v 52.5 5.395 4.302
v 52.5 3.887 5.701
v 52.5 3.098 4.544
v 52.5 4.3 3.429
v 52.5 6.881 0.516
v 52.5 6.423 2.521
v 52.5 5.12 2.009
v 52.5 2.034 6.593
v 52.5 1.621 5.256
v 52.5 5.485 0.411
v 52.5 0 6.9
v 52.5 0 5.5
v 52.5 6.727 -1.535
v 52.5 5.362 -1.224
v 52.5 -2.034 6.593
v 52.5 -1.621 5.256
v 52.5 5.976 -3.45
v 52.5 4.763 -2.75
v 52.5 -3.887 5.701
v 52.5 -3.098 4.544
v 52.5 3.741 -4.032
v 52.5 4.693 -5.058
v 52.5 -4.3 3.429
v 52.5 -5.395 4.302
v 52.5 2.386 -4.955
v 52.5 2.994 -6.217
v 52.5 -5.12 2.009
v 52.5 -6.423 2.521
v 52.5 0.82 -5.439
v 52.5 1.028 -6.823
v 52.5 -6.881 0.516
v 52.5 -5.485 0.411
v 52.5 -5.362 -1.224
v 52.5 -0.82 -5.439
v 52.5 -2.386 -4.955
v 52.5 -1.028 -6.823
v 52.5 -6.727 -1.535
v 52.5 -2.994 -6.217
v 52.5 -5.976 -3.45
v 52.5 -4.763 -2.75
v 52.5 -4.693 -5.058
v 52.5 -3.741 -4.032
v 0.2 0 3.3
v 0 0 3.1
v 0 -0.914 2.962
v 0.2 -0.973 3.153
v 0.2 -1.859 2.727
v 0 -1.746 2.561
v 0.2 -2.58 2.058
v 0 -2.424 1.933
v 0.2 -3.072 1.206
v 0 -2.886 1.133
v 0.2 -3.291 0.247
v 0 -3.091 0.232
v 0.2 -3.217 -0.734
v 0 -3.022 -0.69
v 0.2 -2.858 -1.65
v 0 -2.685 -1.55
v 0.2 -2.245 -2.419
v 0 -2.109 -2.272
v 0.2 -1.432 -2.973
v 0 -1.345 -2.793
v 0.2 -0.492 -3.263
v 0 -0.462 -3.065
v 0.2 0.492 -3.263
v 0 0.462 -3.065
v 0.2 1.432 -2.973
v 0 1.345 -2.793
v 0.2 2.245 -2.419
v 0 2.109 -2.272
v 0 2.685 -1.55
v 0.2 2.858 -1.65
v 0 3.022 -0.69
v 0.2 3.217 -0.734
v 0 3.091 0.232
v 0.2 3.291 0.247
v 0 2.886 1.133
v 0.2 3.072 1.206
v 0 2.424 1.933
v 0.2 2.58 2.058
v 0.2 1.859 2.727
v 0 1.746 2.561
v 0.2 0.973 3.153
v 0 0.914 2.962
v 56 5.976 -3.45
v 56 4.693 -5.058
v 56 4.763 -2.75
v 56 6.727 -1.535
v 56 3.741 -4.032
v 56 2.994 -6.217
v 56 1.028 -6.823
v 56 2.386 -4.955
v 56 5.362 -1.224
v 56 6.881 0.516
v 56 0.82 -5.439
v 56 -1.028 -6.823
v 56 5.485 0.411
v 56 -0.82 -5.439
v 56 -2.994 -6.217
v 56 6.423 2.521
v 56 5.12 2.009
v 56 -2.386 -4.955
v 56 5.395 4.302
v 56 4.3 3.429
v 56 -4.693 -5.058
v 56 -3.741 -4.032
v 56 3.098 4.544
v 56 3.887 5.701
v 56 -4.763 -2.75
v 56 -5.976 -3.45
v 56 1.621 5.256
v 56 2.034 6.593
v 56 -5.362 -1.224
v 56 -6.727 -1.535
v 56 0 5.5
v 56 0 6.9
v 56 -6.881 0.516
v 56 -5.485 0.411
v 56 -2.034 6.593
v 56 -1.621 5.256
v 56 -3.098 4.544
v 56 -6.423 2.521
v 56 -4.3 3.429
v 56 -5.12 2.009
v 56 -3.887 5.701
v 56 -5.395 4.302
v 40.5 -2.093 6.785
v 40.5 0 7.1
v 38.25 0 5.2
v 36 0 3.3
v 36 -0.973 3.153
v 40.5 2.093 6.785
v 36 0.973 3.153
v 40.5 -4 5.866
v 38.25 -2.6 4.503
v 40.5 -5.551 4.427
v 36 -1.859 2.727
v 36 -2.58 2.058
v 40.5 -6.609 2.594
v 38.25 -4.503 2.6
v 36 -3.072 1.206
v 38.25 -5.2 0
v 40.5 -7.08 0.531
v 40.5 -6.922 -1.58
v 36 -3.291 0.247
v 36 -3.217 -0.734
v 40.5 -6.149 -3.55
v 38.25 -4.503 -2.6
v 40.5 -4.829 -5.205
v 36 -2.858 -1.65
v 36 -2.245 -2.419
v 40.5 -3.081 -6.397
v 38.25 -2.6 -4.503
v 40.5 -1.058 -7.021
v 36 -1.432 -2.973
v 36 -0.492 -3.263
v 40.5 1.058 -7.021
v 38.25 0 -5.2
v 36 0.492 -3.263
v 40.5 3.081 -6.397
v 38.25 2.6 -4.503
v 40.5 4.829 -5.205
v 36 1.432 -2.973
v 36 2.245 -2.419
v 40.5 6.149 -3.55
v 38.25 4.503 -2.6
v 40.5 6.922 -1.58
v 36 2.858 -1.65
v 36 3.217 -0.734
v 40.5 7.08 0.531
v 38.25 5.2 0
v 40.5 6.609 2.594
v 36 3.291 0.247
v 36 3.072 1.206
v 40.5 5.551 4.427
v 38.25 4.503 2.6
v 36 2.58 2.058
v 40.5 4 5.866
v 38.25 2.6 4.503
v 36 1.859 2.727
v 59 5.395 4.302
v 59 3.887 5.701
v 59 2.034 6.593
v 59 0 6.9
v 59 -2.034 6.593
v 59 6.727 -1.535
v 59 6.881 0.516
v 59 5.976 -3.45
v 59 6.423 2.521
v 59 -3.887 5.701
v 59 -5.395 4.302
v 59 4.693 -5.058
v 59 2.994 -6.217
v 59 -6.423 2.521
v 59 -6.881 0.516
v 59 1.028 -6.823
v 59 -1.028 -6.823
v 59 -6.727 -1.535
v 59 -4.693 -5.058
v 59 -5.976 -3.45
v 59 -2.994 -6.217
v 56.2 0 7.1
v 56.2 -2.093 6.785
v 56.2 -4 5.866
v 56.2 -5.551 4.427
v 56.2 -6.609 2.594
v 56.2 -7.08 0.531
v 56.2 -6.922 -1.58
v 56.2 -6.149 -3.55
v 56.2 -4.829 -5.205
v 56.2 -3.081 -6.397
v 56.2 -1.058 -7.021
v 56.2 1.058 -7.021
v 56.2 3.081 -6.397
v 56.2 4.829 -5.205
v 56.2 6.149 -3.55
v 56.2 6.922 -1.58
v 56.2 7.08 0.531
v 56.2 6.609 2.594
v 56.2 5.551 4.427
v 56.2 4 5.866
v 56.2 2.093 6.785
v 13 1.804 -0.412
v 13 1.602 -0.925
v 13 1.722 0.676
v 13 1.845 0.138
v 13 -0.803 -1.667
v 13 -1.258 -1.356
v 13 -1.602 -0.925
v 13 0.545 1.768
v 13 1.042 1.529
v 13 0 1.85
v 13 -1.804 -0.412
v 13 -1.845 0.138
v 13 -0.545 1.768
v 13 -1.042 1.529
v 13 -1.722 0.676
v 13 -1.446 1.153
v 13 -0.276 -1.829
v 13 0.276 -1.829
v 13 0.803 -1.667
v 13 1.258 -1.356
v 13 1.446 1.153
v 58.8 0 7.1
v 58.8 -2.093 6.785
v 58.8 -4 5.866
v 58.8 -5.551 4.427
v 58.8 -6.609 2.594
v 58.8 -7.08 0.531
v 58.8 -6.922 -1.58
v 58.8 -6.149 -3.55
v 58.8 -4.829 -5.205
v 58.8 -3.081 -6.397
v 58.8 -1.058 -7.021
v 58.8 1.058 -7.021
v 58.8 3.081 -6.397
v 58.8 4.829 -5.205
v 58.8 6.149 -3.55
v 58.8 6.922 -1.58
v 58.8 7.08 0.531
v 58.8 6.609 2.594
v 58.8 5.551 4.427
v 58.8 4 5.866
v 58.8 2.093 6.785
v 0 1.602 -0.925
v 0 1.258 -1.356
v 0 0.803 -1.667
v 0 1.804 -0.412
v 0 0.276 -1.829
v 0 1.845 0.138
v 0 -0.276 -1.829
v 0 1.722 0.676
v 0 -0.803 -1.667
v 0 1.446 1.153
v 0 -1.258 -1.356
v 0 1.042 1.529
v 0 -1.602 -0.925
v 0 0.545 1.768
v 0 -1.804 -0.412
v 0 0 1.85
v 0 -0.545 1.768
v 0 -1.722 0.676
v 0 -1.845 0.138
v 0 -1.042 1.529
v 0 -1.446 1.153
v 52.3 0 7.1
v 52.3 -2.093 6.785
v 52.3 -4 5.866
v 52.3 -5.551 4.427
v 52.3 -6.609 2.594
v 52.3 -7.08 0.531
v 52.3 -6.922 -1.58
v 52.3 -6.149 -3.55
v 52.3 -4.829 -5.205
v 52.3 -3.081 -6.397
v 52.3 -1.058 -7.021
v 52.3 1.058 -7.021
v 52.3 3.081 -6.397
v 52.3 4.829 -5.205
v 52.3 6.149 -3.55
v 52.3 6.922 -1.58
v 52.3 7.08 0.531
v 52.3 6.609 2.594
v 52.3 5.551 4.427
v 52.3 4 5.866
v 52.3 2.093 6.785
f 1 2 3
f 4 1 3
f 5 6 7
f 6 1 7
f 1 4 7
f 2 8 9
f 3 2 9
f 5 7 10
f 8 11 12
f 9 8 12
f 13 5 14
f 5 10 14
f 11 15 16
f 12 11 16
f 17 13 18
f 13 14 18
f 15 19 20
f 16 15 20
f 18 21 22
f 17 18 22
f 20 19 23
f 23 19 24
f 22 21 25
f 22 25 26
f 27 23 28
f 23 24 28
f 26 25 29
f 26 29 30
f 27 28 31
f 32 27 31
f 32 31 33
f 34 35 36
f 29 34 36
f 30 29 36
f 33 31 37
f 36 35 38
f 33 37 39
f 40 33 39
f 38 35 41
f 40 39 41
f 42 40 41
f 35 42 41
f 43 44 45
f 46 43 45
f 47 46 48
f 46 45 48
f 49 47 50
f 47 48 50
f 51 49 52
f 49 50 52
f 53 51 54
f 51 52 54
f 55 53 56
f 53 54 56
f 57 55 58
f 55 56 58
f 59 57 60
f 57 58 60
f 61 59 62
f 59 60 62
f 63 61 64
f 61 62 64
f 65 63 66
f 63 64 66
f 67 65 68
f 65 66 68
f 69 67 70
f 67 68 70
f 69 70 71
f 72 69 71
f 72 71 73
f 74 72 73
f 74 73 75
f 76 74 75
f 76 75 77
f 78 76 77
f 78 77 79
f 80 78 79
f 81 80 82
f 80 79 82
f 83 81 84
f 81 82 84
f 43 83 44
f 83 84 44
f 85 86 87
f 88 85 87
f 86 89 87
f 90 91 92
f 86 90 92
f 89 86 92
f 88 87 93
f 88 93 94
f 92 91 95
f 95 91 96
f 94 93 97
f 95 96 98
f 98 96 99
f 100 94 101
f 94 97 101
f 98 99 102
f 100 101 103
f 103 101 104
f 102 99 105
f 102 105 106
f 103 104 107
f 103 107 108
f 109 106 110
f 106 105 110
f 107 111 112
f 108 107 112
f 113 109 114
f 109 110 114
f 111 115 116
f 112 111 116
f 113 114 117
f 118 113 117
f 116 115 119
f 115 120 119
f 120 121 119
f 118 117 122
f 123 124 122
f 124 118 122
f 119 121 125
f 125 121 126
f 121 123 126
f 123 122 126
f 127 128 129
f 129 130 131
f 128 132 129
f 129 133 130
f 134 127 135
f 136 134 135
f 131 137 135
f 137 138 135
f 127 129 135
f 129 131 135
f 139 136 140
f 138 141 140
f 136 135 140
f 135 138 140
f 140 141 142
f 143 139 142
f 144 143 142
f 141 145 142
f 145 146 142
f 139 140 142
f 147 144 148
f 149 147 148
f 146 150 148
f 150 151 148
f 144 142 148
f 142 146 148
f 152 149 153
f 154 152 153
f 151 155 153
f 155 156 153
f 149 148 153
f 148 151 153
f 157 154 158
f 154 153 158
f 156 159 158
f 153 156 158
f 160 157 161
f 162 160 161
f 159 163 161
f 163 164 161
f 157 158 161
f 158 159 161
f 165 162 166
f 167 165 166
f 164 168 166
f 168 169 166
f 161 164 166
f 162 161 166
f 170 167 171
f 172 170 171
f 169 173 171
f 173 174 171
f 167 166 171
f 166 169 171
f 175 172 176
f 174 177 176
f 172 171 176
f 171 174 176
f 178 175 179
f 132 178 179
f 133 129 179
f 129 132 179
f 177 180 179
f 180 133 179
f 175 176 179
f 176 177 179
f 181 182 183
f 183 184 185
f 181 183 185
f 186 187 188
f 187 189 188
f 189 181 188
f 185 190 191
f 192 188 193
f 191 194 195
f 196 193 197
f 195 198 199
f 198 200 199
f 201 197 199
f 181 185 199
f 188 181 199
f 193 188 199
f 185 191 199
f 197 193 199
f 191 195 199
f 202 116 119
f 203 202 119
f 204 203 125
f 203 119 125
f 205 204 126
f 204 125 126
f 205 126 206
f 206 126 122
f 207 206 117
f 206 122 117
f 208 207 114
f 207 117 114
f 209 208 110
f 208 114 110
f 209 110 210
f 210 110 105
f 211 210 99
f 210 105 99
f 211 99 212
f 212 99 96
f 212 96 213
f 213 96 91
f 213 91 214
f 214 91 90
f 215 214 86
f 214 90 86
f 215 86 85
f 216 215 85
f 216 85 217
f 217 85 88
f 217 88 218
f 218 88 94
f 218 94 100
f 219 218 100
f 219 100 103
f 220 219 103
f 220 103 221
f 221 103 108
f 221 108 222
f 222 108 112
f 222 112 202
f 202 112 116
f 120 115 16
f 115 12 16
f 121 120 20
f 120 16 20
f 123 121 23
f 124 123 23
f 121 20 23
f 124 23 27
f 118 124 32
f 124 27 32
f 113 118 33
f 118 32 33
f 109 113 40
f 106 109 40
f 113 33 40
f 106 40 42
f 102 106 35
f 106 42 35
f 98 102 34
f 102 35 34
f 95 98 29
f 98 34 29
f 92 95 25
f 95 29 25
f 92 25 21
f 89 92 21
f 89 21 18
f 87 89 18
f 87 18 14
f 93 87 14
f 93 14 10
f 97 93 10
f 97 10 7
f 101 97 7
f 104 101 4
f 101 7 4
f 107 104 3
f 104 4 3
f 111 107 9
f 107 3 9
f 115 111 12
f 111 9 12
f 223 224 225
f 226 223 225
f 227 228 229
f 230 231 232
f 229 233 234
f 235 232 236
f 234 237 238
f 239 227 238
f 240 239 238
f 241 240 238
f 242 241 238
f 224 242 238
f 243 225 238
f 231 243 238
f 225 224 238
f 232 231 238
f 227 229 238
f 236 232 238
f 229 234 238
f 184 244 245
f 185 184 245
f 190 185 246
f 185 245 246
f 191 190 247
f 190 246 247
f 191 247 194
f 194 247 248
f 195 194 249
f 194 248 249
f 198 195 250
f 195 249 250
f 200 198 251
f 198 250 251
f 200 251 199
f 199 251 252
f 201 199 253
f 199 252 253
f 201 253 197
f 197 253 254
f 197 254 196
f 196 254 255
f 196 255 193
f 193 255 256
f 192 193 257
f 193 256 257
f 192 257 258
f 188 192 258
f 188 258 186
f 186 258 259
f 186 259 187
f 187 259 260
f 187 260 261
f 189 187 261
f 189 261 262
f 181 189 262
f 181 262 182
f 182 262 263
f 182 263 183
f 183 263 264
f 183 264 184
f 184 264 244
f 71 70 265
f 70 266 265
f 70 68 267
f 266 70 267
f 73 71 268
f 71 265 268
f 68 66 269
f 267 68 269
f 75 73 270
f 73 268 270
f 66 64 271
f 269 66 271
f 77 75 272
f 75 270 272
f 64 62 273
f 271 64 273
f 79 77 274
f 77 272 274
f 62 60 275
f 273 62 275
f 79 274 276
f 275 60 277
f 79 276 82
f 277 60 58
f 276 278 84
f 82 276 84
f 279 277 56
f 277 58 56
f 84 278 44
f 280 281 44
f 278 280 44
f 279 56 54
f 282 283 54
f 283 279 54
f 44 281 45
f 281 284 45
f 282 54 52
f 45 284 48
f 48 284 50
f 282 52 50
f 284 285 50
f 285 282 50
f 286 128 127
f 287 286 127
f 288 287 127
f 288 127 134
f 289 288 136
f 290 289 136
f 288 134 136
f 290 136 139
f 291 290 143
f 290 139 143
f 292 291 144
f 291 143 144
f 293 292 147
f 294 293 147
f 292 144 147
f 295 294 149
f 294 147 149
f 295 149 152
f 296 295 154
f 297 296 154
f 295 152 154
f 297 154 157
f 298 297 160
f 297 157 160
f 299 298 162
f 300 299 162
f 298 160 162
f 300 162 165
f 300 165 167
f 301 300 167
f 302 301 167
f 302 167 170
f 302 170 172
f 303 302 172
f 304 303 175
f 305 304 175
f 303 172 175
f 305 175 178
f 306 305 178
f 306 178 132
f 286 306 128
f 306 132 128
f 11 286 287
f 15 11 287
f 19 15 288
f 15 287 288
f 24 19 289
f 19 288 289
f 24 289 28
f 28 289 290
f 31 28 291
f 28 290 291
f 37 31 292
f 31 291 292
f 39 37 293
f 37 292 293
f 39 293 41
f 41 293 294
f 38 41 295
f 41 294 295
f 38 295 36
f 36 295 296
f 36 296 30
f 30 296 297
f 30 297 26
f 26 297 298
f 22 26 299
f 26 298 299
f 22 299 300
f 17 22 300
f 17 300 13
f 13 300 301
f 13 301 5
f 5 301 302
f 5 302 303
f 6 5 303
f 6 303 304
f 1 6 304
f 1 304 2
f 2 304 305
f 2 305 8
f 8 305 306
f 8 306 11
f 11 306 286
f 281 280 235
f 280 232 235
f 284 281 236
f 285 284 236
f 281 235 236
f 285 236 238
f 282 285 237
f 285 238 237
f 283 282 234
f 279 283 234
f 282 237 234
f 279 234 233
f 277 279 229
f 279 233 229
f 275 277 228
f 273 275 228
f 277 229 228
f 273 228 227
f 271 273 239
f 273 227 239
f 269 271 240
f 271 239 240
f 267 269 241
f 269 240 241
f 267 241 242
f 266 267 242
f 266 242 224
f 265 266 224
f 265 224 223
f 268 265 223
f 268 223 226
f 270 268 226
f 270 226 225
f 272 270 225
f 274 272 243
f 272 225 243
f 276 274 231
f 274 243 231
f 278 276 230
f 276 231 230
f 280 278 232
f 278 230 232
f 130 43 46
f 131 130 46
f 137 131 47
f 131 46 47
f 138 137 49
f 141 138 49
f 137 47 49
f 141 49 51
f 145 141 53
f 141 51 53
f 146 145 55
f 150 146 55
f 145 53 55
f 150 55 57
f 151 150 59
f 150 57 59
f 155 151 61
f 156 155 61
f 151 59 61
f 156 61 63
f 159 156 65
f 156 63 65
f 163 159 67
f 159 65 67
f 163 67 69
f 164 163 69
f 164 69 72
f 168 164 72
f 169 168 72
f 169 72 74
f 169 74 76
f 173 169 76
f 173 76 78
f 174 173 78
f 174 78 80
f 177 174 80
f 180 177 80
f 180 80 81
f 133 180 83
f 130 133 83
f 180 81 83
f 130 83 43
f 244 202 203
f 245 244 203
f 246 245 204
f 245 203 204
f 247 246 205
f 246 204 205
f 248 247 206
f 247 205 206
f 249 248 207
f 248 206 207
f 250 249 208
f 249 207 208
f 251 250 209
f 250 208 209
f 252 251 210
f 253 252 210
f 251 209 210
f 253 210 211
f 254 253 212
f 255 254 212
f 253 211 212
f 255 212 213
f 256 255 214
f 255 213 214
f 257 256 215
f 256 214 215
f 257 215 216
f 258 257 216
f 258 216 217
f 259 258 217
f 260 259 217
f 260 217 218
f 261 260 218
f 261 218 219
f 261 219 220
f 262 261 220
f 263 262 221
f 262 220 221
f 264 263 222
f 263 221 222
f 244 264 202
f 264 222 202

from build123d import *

# Parameters (mm, degrees)
CHANFRO2_SIZE = 0.2


with BuildPart() as part:
    # Esboço1 → Revolução1 (revolve)
    with BuildSketch(Plane.XY, mode=Mode.PRIVATE) as revolu_o1_sk:
        Polygon((13, 0), (59, 0), (59, 7.1), (56, 7.1), (56, 5.5), (52.5, 5.5), (52.5, 7.1), (40.5, 7.1), (36, 3.3), (0, 3.3), (0, 1.85), (13, 1.85), align=None)
    revolve(revolu_o1_sk.sketch.rotate(Axis((13, 0, 0), (1, 0, 0)), 90), axis=Axis((13, 0, 0), (1, 0, 0)))

    # Chanfro2
    chanfro2_edges = [part.edges().sort_by_distance(p)[0] for p in [
        (0, 0, -3.3),
        (52.5, 0, -7.1),
        (56, 0, -7.1),
        (59, 0, -7.1),
    ]]
    chamfer(chanfro2_edges, length=CHANFRO2_SIZE)


solid = part.part
